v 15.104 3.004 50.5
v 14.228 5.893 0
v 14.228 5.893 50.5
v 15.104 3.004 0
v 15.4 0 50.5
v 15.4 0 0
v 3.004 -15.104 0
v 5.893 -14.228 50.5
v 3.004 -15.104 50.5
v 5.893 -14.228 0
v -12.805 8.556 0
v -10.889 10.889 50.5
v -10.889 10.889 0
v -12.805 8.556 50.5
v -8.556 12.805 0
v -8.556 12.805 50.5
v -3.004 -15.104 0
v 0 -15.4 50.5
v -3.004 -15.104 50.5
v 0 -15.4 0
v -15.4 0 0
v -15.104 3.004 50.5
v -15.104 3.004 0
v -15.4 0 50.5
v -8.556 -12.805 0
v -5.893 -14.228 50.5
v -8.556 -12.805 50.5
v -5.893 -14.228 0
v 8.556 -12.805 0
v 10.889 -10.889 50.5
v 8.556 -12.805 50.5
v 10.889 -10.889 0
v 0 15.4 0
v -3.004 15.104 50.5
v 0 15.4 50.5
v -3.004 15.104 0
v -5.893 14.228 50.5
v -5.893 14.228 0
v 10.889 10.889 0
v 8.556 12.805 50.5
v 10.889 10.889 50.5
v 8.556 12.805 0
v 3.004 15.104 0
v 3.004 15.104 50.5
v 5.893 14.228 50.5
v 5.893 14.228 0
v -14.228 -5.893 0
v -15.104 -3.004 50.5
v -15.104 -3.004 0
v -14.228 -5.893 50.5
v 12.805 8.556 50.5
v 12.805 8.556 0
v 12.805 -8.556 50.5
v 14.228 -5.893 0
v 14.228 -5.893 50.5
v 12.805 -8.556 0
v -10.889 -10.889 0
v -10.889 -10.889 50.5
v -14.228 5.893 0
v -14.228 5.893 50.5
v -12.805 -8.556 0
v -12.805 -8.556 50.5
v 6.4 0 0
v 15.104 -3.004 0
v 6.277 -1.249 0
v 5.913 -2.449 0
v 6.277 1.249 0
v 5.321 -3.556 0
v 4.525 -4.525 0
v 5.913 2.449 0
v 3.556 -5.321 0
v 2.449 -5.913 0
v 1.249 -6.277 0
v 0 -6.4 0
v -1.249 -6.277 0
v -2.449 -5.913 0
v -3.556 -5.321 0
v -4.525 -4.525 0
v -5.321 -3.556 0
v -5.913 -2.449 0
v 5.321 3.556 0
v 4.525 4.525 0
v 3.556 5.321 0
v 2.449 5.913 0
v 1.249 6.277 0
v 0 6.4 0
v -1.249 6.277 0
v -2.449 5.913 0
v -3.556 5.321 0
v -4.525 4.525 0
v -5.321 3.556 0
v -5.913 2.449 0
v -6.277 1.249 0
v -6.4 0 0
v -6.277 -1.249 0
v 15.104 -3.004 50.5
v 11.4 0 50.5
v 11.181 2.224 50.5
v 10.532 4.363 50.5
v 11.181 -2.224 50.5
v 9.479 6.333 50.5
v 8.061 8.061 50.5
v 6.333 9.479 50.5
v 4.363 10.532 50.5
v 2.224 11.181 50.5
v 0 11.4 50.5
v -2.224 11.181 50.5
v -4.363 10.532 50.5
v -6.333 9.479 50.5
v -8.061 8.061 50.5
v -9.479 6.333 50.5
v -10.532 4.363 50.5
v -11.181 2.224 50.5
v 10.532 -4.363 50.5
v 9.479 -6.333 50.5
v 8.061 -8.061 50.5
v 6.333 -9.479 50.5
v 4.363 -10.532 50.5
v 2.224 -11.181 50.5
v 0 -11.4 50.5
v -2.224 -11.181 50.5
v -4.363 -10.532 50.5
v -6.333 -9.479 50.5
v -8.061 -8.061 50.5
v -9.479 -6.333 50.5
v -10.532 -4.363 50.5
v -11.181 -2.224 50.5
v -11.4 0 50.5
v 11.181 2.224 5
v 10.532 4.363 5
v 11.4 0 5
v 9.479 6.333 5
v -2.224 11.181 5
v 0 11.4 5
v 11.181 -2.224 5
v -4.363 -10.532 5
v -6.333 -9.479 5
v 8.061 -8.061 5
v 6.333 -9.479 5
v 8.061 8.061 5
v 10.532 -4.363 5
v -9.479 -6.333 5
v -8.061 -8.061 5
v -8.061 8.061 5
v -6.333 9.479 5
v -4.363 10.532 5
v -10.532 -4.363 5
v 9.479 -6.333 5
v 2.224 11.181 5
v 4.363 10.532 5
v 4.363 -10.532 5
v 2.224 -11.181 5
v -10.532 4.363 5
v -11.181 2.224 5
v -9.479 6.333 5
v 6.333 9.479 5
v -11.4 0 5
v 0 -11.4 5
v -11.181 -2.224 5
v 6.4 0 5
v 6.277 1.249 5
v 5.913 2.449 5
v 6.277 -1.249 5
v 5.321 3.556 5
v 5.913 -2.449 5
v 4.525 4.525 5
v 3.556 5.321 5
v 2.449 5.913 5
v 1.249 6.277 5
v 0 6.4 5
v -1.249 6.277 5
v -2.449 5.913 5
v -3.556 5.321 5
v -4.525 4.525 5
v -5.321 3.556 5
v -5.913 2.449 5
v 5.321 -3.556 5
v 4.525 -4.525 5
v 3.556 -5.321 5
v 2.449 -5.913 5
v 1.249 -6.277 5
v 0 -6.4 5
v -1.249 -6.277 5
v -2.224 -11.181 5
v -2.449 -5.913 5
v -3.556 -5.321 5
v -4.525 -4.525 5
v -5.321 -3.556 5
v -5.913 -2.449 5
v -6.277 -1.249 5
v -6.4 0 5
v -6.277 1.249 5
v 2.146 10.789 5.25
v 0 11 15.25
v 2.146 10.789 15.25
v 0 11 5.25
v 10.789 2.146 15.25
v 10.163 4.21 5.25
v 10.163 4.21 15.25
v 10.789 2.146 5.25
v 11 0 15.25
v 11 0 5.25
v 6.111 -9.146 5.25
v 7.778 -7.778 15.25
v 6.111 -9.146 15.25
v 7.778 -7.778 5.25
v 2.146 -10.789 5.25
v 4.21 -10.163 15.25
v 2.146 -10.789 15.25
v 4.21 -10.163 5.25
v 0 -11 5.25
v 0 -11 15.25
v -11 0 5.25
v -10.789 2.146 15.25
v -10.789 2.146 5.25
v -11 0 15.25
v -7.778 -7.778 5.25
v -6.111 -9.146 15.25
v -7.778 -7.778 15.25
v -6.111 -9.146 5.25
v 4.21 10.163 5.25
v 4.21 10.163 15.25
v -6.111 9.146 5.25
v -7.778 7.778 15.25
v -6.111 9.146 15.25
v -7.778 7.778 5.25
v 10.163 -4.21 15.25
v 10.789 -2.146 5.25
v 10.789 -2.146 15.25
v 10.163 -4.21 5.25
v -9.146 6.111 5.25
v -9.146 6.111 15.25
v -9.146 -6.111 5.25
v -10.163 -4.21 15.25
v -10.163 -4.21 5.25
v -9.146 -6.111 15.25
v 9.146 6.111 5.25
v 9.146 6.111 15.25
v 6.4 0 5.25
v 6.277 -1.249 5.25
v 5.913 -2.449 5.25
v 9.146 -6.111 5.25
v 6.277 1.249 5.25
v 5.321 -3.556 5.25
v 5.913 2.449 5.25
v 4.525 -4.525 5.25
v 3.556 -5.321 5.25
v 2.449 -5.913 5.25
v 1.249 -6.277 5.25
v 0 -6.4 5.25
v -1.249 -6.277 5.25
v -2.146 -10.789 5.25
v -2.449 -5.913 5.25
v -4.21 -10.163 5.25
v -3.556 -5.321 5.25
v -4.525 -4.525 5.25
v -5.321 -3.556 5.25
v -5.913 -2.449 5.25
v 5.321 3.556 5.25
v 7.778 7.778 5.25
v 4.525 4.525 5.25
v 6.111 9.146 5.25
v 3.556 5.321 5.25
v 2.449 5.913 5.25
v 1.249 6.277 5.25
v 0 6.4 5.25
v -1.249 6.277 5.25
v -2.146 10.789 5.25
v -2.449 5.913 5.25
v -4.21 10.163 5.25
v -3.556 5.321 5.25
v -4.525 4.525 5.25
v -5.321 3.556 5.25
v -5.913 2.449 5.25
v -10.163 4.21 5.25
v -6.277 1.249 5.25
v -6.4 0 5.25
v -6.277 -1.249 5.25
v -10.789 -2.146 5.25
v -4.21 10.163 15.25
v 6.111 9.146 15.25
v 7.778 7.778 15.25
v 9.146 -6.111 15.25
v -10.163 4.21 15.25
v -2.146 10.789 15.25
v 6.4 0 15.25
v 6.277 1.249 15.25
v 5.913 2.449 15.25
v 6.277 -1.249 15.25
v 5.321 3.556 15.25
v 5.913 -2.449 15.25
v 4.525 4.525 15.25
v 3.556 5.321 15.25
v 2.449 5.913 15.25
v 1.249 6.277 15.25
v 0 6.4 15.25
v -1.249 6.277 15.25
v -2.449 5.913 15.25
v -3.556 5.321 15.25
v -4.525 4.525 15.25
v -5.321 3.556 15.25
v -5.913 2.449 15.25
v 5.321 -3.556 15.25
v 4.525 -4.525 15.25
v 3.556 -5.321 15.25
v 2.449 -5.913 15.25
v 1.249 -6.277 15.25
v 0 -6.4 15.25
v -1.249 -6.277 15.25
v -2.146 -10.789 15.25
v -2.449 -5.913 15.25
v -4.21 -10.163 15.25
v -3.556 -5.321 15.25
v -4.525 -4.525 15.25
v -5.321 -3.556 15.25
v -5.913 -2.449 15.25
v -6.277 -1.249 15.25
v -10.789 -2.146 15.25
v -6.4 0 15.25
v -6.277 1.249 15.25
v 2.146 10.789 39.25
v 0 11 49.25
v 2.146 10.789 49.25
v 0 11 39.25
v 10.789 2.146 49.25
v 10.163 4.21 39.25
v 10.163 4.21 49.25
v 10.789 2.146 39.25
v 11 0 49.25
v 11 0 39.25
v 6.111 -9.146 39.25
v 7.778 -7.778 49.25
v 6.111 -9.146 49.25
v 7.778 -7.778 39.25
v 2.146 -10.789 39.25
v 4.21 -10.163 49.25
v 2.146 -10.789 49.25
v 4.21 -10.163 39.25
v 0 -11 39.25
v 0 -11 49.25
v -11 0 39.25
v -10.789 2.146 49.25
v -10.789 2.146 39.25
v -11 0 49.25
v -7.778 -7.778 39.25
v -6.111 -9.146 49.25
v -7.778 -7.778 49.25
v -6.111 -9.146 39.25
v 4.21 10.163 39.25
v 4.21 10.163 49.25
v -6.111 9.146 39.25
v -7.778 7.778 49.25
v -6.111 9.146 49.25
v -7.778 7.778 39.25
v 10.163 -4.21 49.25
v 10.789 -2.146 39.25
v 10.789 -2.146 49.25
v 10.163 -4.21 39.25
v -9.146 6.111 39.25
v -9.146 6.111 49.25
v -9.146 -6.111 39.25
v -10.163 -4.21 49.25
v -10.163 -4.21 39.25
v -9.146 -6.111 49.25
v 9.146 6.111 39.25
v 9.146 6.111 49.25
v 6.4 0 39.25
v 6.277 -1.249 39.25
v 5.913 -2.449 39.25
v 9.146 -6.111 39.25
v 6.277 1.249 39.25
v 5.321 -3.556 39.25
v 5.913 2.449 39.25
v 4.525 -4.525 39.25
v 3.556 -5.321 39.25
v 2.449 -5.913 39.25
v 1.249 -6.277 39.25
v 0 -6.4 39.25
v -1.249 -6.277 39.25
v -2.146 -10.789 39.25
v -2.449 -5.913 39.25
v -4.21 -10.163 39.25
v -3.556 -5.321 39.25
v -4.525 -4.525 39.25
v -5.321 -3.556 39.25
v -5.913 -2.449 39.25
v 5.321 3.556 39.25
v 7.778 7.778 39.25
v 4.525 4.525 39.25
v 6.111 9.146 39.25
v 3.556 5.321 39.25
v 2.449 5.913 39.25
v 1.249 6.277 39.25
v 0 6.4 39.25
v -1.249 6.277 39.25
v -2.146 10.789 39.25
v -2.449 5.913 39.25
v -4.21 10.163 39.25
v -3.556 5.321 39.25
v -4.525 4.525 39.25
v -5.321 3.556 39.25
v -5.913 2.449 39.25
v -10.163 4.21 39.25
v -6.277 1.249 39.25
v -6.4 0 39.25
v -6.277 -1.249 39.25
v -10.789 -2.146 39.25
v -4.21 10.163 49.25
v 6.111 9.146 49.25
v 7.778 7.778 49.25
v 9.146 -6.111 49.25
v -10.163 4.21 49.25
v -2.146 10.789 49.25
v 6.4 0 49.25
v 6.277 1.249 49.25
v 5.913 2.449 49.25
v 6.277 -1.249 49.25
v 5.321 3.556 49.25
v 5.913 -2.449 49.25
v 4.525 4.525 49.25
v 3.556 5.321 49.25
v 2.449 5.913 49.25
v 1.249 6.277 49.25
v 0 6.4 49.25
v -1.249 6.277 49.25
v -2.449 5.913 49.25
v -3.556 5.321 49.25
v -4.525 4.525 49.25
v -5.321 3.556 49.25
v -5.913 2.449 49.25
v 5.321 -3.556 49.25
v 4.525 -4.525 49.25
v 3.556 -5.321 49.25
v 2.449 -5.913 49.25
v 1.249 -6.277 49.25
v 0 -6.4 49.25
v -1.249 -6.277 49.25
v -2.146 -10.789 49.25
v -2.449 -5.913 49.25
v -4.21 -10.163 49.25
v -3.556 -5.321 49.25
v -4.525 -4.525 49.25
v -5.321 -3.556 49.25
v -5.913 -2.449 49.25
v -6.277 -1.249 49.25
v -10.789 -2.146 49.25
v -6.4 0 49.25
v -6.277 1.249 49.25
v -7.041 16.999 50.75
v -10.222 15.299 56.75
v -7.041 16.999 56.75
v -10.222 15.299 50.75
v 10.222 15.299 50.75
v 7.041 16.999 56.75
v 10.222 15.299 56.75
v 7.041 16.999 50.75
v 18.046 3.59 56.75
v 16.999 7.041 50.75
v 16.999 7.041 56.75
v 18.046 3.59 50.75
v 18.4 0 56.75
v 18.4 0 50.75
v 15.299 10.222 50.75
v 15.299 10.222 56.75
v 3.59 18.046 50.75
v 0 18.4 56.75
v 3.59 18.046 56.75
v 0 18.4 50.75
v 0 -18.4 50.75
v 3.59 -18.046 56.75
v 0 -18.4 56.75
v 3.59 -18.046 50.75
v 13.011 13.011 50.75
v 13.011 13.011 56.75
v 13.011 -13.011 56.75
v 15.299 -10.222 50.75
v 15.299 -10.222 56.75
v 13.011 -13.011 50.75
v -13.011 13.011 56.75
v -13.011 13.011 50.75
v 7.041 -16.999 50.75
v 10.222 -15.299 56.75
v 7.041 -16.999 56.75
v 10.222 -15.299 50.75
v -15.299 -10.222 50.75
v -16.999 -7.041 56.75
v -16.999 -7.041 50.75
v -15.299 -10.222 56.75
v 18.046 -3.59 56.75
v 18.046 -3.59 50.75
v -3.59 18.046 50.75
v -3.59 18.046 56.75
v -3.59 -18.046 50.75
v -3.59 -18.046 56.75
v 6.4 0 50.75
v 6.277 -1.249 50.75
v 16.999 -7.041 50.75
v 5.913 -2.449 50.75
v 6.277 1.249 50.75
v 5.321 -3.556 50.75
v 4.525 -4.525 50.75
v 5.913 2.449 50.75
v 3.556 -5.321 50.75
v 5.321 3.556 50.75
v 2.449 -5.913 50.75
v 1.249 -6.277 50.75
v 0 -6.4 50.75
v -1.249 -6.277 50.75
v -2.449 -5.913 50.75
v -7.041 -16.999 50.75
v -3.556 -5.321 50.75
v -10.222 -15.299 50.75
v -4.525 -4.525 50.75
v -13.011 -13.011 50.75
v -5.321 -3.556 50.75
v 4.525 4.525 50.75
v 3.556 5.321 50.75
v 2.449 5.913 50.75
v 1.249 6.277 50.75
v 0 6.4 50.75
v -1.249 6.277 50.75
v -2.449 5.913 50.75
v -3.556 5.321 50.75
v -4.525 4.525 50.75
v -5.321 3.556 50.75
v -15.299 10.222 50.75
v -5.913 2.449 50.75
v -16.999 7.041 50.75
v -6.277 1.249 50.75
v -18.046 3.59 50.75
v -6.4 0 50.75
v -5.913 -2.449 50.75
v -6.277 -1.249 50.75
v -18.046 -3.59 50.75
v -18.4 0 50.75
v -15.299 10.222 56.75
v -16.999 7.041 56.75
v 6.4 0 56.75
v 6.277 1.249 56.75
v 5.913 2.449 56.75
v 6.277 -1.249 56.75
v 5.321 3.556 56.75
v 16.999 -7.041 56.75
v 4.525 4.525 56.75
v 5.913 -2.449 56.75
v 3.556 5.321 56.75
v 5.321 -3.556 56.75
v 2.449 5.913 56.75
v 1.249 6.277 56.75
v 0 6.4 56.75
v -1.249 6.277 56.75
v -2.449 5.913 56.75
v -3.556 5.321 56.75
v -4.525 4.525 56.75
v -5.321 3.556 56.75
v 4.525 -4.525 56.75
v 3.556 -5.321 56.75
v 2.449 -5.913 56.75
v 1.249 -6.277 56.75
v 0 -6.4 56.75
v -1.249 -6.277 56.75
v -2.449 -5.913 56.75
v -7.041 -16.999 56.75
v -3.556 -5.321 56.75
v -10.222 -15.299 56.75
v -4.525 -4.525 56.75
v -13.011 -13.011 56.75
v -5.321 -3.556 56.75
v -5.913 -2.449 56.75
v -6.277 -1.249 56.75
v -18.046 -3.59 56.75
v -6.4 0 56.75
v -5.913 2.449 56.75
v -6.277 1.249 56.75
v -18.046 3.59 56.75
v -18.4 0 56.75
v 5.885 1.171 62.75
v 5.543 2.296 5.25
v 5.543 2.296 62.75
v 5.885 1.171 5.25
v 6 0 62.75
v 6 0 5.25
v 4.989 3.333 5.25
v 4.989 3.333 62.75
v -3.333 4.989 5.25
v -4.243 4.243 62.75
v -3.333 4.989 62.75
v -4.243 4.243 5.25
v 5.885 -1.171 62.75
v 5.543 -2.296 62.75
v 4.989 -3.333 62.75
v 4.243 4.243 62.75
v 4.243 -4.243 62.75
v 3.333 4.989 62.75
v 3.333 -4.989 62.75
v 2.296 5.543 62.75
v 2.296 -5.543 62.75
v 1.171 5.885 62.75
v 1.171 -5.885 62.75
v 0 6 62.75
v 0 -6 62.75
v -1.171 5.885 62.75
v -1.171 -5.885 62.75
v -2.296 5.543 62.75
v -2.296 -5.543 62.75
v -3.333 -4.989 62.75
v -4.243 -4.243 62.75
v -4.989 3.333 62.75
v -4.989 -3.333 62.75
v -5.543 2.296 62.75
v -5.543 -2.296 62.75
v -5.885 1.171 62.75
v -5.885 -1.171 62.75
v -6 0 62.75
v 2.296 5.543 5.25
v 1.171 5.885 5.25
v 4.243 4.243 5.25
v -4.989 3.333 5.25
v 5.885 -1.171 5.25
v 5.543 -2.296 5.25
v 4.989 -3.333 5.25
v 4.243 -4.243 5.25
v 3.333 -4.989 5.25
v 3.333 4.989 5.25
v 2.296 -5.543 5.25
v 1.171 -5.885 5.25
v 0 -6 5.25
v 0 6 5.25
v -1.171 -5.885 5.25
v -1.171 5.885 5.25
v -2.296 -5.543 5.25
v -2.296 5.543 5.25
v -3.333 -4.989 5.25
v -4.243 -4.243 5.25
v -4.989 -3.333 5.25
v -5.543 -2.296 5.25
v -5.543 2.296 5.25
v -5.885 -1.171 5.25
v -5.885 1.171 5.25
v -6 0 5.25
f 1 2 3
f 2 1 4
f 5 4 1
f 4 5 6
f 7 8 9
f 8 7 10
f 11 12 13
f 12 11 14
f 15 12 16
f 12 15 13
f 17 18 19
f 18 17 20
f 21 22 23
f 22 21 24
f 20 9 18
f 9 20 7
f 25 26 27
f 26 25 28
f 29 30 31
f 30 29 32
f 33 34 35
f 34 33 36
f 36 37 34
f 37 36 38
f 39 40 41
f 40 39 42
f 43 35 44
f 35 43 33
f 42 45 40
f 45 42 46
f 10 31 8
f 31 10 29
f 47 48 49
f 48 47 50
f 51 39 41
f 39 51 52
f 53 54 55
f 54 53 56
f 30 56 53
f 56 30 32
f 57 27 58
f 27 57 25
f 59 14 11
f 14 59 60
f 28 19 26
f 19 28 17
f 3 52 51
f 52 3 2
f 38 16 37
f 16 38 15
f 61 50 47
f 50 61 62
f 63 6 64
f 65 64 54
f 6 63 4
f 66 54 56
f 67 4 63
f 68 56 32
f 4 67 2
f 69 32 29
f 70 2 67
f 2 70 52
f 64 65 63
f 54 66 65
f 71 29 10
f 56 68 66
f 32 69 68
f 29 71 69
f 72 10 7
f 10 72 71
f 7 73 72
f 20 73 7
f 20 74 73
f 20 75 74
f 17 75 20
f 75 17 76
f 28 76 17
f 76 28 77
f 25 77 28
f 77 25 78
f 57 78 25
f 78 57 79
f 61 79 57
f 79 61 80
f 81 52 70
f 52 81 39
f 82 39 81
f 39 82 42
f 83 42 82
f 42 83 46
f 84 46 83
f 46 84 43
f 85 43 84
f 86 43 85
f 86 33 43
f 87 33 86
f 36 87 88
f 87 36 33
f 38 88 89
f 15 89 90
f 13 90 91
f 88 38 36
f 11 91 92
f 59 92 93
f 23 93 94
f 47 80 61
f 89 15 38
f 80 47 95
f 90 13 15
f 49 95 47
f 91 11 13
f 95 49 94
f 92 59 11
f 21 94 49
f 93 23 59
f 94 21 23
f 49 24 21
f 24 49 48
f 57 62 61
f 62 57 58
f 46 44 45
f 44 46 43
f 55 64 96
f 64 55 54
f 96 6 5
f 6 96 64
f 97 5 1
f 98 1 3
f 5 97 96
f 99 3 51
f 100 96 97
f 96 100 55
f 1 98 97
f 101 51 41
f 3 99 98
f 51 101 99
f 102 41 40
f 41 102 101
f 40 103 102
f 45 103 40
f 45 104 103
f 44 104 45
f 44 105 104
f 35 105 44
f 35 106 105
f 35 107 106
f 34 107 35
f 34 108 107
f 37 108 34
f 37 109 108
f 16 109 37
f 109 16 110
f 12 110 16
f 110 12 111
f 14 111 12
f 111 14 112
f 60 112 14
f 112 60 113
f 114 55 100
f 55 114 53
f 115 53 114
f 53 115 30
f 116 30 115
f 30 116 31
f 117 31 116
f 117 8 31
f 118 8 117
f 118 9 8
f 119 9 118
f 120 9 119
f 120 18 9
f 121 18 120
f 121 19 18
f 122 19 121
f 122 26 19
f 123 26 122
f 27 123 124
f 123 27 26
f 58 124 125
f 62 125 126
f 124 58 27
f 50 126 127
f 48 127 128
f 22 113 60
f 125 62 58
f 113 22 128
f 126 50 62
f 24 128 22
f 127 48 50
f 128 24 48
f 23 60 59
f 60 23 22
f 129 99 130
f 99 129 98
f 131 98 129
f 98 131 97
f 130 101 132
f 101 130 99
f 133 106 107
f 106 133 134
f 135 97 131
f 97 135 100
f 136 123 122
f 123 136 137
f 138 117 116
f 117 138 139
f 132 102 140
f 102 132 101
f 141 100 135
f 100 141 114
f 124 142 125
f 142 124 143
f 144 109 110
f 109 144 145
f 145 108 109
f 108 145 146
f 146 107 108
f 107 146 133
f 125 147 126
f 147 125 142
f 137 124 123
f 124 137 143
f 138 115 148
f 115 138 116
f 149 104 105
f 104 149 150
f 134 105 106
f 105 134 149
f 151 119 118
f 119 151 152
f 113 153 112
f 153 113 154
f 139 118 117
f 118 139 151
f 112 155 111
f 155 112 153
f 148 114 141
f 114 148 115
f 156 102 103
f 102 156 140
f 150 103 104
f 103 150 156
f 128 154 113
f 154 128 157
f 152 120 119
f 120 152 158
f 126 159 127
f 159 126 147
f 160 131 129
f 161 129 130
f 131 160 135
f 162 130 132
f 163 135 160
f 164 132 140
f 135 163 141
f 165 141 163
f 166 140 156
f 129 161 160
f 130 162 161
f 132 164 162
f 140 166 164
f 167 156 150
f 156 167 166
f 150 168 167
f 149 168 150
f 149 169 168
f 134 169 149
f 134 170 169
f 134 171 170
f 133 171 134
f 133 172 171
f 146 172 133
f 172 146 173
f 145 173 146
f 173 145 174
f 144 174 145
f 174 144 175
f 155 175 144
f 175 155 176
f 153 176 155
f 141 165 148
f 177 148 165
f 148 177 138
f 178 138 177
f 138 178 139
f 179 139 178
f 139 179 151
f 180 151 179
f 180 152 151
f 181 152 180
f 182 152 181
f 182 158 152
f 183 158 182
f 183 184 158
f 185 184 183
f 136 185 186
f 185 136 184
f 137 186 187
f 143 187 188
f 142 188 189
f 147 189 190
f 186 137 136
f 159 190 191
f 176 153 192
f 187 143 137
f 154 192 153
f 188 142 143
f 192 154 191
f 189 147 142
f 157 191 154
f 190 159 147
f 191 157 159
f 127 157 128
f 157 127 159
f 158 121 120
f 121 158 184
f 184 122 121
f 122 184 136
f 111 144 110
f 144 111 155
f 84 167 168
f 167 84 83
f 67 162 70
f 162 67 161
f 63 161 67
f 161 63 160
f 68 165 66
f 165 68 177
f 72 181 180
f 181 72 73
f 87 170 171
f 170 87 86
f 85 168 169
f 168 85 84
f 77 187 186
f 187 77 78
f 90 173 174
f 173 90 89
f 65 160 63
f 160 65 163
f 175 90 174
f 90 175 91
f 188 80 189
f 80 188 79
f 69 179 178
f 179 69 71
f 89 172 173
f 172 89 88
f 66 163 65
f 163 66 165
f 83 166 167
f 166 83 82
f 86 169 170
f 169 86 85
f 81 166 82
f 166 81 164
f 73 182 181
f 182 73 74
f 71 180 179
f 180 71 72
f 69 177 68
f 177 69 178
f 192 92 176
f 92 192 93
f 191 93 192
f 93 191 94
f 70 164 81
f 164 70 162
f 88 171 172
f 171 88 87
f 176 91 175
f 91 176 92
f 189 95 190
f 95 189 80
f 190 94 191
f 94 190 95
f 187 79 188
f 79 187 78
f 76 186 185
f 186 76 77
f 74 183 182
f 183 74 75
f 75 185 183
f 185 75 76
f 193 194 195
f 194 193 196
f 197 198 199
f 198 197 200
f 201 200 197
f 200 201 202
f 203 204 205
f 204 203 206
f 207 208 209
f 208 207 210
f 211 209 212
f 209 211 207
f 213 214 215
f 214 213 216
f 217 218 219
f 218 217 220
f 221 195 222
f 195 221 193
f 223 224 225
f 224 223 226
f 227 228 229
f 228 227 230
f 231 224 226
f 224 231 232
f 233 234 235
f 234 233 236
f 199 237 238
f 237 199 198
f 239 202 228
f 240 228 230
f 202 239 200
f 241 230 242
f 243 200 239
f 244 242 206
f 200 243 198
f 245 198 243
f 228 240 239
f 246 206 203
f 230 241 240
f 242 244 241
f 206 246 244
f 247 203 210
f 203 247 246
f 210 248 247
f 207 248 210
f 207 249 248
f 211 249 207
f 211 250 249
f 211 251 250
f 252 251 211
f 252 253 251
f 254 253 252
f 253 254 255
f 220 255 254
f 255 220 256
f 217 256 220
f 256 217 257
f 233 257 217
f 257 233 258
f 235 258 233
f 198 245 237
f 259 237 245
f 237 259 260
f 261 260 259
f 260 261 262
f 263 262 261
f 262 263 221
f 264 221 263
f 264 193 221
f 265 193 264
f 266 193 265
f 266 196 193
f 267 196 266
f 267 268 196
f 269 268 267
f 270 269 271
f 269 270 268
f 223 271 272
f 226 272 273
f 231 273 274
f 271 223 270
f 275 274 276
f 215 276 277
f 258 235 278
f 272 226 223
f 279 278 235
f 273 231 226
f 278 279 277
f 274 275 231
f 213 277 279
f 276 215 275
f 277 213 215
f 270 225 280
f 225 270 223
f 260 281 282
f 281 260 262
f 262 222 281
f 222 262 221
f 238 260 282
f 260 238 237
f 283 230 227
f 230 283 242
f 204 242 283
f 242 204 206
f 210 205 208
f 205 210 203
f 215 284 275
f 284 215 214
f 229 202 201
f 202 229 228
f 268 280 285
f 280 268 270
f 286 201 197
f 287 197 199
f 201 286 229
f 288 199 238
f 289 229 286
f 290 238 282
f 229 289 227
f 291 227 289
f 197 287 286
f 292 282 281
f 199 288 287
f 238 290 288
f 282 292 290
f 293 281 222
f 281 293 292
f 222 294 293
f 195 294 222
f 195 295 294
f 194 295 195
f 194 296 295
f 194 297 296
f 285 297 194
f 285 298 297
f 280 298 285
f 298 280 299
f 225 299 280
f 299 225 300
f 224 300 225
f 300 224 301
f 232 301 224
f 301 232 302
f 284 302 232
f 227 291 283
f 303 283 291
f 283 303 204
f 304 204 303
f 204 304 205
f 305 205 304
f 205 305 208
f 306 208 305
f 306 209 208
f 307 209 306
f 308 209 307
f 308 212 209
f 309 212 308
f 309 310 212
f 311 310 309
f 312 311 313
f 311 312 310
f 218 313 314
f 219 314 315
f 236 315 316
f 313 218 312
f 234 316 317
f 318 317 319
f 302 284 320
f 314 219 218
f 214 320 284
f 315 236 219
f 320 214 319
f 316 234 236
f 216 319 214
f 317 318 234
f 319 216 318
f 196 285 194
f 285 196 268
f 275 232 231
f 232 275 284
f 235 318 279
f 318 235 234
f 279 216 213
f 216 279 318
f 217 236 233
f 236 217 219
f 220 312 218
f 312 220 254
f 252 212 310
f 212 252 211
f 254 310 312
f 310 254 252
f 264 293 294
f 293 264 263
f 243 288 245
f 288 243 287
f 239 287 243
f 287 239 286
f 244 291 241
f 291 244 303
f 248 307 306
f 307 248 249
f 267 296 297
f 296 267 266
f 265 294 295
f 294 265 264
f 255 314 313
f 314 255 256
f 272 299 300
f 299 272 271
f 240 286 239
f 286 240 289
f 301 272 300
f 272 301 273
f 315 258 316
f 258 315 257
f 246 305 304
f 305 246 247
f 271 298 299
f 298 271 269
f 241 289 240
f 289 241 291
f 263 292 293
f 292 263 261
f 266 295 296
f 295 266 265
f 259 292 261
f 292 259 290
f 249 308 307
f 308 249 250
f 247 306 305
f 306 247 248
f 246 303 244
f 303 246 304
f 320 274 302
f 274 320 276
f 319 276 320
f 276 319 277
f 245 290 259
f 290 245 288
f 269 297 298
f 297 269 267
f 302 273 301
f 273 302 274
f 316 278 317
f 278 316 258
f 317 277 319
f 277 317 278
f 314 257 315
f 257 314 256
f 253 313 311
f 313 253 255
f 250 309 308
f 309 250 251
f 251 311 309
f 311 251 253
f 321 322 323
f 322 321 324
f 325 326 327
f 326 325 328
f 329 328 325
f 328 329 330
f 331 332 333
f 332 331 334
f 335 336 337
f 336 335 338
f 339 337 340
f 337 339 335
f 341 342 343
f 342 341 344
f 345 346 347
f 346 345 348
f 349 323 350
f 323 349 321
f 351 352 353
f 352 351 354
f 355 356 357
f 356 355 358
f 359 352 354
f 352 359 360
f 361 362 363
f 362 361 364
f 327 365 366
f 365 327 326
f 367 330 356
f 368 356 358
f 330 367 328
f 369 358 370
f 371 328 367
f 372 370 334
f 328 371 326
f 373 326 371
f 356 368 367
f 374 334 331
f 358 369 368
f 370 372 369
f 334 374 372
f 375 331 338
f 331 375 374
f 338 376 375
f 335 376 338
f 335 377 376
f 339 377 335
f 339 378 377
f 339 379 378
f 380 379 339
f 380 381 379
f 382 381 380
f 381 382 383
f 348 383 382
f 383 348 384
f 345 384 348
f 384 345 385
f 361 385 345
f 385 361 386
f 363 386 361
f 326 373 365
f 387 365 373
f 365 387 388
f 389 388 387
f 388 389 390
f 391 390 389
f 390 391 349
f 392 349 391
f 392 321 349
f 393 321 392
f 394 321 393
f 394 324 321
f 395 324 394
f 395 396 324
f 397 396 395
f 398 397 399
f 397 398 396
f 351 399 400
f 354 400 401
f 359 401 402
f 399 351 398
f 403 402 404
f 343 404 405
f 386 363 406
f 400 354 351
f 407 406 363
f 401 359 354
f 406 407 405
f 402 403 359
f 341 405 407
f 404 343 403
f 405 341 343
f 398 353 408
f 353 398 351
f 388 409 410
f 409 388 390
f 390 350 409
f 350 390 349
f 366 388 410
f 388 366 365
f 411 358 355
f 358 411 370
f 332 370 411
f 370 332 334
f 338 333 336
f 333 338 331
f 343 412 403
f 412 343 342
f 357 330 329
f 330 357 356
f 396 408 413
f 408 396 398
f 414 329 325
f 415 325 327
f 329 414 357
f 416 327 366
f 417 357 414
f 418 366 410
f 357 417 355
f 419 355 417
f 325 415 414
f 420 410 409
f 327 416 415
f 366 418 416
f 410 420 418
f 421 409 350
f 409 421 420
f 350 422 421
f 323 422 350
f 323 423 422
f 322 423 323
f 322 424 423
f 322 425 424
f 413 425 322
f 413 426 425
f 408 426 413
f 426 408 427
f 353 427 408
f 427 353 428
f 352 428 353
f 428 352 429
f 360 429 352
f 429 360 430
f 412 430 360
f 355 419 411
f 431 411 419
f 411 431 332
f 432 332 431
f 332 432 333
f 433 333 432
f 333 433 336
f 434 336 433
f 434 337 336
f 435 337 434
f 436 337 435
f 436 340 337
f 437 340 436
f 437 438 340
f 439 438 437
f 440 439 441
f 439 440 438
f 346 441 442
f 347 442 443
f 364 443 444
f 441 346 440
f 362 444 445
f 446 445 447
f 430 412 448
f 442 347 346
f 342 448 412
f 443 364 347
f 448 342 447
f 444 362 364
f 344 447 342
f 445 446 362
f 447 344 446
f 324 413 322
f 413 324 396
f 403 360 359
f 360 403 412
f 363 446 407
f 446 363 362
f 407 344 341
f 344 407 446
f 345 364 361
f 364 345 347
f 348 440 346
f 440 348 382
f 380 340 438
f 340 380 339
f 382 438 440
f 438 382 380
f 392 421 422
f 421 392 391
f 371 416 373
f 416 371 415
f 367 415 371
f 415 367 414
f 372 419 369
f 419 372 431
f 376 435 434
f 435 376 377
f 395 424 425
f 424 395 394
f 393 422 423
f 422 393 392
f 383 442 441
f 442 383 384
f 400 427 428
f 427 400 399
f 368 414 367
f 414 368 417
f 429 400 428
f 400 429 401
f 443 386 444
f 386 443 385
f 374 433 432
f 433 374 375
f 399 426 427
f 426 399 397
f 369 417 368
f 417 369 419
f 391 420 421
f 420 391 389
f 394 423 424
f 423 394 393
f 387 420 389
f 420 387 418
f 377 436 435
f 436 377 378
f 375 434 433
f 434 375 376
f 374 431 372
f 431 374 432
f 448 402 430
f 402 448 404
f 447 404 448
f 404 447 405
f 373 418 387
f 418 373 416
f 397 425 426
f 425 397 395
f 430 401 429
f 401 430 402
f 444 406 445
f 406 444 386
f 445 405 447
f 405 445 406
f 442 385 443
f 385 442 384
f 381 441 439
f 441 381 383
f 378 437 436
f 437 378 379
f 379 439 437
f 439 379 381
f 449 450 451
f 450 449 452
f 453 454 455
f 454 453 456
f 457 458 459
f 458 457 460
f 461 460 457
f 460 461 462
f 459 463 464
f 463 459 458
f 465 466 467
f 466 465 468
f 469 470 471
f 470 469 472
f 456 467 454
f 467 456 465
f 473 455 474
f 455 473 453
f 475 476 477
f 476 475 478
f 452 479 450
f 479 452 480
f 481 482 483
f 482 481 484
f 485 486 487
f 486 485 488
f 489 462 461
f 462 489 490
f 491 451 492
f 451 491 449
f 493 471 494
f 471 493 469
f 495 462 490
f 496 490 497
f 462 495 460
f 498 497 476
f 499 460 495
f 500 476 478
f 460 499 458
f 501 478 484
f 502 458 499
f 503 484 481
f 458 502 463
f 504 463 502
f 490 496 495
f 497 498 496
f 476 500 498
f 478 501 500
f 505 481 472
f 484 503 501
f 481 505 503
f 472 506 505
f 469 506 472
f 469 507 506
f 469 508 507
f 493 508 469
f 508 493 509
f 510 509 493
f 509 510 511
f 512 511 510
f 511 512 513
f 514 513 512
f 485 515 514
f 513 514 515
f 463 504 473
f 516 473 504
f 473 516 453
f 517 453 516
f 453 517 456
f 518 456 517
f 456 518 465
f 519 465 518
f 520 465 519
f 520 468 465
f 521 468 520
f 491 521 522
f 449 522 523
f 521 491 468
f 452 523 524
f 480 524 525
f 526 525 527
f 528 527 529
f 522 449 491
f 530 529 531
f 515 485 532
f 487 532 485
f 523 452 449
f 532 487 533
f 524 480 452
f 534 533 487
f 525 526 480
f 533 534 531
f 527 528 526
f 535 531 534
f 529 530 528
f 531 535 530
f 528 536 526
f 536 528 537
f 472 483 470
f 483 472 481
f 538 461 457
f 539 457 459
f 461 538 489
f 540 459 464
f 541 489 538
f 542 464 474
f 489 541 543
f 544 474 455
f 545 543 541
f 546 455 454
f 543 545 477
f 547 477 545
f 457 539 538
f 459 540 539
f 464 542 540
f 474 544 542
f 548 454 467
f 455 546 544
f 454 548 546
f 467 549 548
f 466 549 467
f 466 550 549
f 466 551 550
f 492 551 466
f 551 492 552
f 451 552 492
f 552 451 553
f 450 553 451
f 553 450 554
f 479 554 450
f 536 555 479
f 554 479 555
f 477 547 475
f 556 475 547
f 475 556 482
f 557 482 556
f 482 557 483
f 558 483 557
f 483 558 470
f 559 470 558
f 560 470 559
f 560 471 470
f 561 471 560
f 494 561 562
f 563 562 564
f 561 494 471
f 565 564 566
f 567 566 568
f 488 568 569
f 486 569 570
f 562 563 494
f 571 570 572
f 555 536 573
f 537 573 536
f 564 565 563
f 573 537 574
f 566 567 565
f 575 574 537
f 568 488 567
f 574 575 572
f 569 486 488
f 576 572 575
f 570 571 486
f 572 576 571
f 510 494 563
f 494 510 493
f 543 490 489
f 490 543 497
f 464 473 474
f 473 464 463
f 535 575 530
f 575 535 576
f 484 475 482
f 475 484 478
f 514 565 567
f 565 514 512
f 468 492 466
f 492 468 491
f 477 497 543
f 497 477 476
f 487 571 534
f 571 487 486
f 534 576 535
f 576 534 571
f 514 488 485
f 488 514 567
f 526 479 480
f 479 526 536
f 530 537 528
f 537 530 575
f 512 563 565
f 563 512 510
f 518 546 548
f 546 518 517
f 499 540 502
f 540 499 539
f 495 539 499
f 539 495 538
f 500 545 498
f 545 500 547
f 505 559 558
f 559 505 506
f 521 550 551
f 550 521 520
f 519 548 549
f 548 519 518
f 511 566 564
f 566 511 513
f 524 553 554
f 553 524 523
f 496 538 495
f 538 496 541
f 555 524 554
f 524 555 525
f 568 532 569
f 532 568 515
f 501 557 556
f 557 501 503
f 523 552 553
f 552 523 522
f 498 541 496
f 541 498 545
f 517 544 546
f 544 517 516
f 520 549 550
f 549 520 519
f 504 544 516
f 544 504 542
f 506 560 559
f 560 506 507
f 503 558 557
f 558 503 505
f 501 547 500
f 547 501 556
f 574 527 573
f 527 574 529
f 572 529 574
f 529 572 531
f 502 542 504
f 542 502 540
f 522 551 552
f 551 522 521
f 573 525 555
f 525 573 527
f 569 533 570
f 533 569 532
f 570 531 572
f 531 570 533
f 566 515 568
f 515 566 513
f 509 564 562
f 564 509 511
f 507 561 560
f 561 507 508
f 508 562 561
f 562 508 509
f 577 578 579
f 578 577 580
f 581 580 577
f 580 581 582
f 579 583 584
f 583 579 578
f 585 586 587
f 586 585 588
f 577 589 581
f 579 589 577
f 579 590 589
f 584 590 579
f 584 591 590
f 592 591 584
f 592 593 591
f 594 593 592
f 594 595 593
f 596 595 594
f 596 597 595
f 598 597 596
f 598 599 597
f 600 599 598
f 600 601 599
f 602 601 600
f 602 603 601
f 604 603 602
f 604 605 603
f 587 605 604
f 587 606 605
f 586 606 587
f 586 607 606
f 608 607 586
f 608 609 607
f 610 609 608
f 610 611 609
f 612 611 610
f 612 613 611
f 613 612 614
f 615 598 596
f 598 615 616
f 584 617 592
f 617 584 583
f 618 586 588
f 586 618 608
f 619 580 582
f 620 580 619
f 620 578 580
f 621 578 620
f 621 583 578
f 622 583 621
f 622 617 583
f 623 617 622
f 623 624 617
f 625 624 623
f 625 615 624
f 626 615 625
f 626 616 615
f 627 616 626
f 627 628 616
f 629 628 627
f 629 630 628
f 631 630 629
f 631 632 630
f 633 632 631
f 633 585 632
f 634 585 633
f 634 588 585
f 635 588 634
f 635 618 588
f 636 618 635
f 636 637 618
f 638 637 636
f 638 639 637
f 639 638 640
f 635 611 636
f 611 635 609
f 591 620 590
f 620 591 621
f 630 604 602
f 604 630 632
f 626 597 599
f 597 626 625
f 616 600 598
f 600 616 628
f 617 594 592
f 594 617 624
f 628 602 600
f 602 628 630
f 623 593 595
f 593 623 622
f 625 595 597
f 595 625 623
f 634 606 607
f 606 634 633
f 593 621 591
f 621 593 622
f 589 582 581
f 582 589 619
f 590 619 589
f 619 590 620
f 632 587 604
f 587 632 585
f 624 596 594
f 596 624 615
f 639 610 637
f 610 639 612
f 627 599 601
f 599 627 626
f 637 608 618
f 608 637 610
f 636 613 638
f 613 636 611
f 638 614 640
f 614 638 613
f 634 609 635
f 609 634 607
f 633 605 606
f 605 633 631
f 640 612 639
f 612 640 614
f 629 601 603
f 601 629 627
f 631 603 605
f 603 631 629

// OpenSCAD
$fn = 32;

// ------------------------------------------------------------------------
// Shaft station: cup d30.8 x 50.5 mm, shaft d12
// Every part is its own module, assembly() places every instance.
// ------------------------------------------------------------------------

// --- part 1 ---
module housing_cup() {
  difference() {
    cylinder(h = 50.5, d = 30.8);
    translate([0, 0, 5]) cylinder(h = 46.5, d = 22.8);
    translate([0, 0, -1]) cylinder(h = 7, d = 12.8);
  }
}

// --- part 2 ---
module bearing_lower() {
  difference() {
      translate([0, 0, 0]) cylinder(h = 10, d = 22);
      translate([0, 0, -1]) cylinder(h = 12, d = 12.8);
    }
}

// --- part 3 ---
module bearing_upper() {
  difference() {
      translate([0, 0, 0]) cylinder(h = 10, d = 22);
      translate([0, 0, -1]) cylinder(h = 12, d = 12.8);
    }
}

// --- part 4 ---
module station_shaft() {
  translate([0, 0, -28.75]) cylinder(h = 57.5, d = 12);
}

// --- part 5 ---
module station_cover() {
  difference() {
    cylinder(h = 6, d = 36.8);
    translate([0, 0, -1]) cylinder(h = 8, d = 12.8);
  }
}

// --- assembly ---
module assembly() {
  color([0.80, 0.24, 0.20]) translate([0, 0, 0]) rotate([0, 0, 0]) housing_cup();
  color([0.20, 0.45, 0.75]) translate([0, 0, 5.25]) rotate([0, 0, 0]) bearing_lower();
  color([0.25, 0.62, 0.32]) translate([0, 0, 39.25]) rotate([0, 0, 0]) bearing_upper();
  color([0.92, 0.70, 0.18]) translate([0, 0, 34]) rotate([0, 0, 0]) station_shaft();
  color([0.58, 0.35, 0.70]) translate([0, 0, 50.75]) rotate([0, 0, 0]) station_cover();
}

assembly();
